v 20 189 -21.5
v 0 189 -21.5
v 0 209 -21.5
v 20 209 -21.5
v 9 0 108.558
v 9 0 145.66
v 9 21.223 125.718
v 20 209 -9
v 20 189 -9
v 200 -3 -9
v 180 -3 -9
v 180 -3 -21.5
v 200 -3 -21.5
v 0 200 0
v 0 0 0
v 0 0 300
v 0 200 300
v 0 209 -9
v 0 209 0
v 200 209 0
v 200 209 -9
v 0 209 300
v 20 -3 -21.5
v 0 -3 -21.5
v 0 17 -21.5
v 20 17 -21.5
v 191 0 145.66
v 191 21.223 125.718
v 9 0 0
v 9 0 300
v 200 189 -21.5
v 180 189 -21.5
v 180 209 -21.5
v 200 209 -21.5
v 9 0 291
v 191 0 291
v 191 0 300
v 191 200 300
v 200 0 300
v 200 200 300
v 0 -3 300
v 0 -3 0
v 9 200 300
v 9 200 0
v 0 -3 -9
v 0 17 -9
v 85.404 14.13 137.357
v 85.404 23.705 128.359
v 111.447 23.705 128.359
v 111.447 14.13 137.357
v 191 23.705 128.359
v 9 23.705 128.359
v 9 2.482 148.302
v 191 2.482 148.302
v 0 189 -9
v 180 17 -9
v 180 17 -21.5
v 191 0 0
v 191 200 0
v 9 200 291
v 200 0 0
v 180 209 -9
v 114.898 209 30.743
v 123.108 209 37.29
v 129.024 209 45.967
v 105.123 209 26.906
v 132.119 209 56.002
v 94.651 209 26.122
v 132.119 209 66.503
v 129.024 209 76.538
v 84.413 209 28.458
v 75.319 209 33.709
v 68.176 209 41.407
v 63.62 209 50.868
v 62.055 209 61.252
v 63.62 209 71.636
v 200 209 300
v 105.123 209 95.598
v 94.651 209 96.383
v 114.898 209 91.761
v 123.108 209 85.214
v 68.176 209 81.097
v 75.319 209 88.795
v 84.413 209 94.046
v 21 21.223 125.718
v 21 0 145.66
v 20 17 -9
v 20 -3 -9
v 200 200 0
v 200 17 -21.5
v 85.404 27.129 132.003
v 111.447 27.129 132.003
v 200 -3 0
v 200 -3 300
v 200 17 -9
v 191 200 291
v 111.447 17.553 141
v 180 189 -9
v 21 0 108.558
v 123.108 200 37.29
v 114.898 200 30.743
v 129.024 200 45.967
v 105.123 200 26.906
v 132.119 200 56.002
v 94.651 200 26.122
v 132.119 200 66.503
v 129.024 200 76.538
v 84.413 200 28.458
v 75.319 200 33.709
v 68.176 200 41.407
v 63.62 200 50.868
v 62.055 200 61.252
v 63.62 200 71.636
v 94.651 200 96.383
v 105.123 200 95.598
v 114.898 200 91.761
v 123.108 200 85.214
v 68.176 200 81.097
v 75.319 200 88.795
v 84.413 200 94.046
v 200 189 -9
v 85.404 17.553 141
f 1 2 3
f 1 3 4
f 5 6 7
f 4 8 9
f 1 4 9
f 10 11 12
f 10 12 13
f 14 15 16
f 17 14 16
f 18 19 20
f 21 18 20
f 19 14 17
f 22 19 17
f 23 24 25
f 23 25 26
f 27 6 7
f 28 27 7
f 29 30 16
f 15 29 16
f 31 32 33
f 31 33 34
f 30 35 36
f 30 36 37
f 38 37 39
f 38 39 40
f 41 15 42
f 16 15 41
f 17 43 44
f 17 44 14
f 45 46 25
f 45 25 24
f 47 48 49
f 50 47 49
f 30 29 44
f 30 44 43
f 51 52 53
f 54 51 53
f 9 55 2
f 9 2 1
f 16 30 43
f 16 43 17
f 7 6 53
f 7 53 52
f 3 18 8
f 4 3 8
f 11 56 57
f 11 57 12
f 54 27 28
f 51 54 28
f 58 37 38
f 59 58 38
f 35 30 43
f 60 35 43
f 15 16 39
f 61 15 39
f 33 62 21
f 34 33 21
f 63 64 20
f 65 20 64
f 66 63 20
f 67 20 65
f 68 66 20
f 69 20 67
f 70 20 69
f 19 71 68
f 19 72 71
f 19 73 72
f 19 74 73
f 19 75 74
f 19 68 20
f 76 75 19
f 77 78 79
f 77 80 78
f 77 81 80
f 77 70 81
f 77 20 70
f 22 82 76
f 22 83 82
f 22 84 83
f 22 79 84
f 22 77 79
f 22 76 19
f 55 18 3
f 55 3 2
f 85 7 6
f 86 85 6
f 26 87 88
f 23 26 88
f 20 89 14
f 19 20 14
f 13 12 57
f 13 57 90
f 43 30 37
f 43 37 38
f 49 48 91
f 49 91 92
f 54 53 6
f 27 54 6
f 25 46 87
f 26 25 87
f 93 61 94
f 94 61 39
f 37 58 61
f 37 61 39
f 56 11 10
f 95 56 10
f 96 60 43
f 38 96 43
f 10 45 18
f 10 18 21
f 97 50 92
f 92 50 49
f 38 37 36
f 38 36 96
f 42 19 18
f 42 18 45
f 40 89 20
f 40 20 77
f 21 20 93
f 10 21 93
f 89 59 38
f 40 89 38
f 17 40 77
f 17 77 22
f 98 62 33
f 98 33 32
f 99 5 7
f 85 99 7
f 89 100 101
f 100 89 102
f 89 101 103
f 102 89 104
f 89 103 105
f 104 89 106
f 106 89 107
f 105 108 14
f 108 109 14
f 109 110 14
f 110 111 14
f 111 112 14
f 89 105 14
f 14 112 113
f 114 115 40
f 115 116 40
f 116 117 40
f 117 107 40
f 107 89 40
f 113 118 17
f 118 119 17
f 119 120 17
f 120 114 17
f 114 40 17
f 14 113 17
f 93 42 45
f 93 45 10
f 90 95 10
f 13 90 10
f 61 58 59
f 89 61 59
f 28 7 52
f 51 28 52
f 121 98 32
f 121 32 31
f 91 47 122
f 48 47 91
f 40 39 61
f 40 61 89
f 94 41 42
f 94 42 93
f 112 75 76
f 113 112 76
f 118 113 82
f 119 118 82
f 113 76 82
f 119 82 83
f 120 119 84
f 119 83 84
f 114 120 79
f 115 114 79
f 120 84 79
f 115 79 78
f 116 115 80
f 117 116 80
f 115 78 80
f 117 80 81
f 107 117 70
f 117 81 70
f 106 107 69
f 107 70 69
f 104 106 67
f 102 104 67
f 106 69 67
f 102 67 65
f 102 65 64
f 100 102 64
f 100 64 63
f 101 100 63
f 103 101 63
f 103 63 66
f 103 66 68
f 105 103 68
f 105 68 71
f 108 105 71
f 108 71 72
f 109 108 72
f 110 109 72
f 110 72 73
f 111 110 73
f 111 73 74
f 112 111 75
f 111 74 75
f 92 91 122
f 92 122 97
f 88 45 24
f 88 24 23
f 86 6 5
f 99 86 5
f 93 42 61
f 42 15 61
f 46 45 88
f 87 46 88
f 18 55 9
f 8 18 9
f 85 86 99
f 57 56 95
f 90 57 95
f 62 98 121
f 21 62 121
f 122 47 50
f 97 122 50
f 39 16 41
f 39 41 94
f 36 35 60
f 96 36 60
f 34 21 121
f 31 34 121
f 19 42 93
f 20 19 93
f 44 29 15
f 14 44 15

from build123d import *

# Parameters (mm, degrees)
F0_W      = 200
F0_H      = 300
F1_DEPTH  = 1.5
F2_DEPTH  = 1.5
F3_W      = 9
F3_H      = 300
F4_DEPTH  = 200
F6_DEPTH  = 12
F8_DEPTH  = 182
F9_W      = 26.0420143604
F9_H      = 13.1397843487
F10_DEPTH = 5
F11_W     = 200
F11_H     = 9
F12_DEPTH = 182
F13_W     = 200
F13_H     = 300
F14_DEPTH = 9
F15_W     = 200
F15_H     = 300
F16_DEPTH = 9
F17_R     = 35.2290412764
F18_DEPTH = 9
F19_W     = 200
F19_H     = 212
F20_DEPTH = 9
F21_W     = 20
F21_H     = 20
F22_DEPTH = 12.5
F23_W     = 20
F23_H     = 20
F24_DEPTH = 12.5
F25_W     = 20
F25_H     = 20
F26_DEPTH = 12.5
F27_W     = 20
F27_H     = 20
F28_DEPTH = 12.5


with BuildPart() as f1:
    # F0 (on Front) → F1 (new body)
    with BuildSketch(Plane.XZ):
        with Locations((100, 150)):
            Rectangle(F0_W, F0_H)
    extrude(amount=F1_DEPTH)

    # F2 (add): a face of the model
    f2_faces = [f1.faces().sort_by_distance(p)[0] for p in [
        (100, -1.5, 150),
    ]]
    extrude(f2_faces, amount=F2_DEPTH)


with BuildPart() as f4:
    # F3 (on face) → F4 (new body)
    with BuildSketch(Plane(origin=(0, 0, 0), x_dir=(-1, 0, 0), z_dir=(0, 1, 0))):
        with Locations((-4.5, 150)):
            Rectangle(F3_W, F3_H)
    extrude(amount=F4_DEPTH)


with BuildPart() as f6:
    # F5 (on face) → F6 (new body)
    with BuildSketch(Plane.YZ.offset(9)):
        Polygon((21.2234966457, 125.7177591324), (0, 145.660340786), (0, 108.5578650236), align=None)
    extrude(amount=F6_DEPTH)


with BuildPart() as f8:
    # F7 (on face) → F8 (new body)
    with BuildSketch(Plane.YZ.offset(9)):
        Polygon((0, 145.660340786), (21.2234966457, 125.7177591324), (23.7052597113, 128.3589262096), (2.4817630656, 148.3015078632), align=None)
    extrude(amount=F8_DEPTH)


with BuildPart() as f10:
    # F9 (on face) → F10 (new body)
    with BuildSketch(Plane(origin=(0, 75.1710426471, 79.9992899207), x_dir=(1, 0, 0), z_dir=(0, 0.6847731802, 0.7287562636))):
        with Locations((98.4255000949, -77.1912857827)):
            Rectangle(F9_W, F9_H)
    extrude(amount=F10_DEPTH)


with BuildPart() as f12:
    # F11 (on face) → F12 (new body)
    with BuildSketch(Plane.YZ.offset(9)):
        with Locations((100, 295.5)):
            Rectangle(F11_W, F11_H)
    extrude(amount=F12_DEPTH)


with BuildPart() as f14:
    # F13 (on face) → F14 (new body)
    with BuildSketch(Plane.YZ.offset(191)):
        with Locations((100, 150)):
            Rectangle(F13_W, F13_H)
    extrude(amount=F14_DEPTH)


with BuildPart() as f16:
    # F15 (on face) → F16 (new body)
    with BuildSketch(Plane(origin=(0, 200, 0), x_dir=(-1, 0, 0), z_dir=(0, 1, 0))):
        with Locations((-100, 150)):
            Rectangle(F15_W, F15_H)
    extrude(amount=F16_DEPTH)

    # F17 (on face) → F18 (cut)
    with BuildSketch(Plane(origin=(0, 209, 0), x_dir=(-1, 0, 0), z_dir=(0, 1, 0))):
        with Locations((-97.2835719585, 61.2522102892)):
            Circle(F17_R)
    extrude(amount=-F18_DEPTH, mode=Mode.SUBTRACT)


with BuildPart() as f20:
    # F19 (on face) → F20 (new body)
    with BuildSketch(Plane(origin=(0, 0, 0), x_dir=(1, 0, 0), z_dir=(0, 0, -1))):
        with Locations((100, -103)):
            Rectangle(F19_W, F19_H)
    extrude(amount=F20_DEPTH)


with BuildPart() as f22:
    # F21 (on face) → F22 (new body)
    with BuildSketch(Plane(origin=(0, 0, -9), x_dir=(1, 0, 0), z_dir=(0, 0, -1))):
        with Locations((10, -7)):
            Rectangle(F21_W, F21_H)
    extrude(amount=F22_DEPTH)


with BuildPart() as f24:
    # F23 (on face) → F24 (new body)
    with BuildSketch(Plane(origin=(0, 0, -9), x_dir=(1, 0, 0), z_dir=(0, 0, -1))):
        with Locations((190, -7)):
            Rectangle(F23_W, F23_H)
    extrude(amount=F24_DEPTH)


with BuildPart() as f26:
    # F25 (on face) → F26 (new body)
    with BuildSketch(Plane(origin=(0, 0, -9), x_dir=(1, 0, 0), z_dir=(0, 0, -1))):
        with Locations((190, -199)):
            Rectangle(F25_W, F25_H)
    extrude(amount=F26_DEPTH)


with BuildPart() as f28:
    # F27 (on face) → F28 (new body)
    with BuildSketch(Plane(origin=(0, 0, -9), x_dir=(1, 0, 0), z_dir=(0, 0, -1))):
        with Locations((10, -199)):
            Rectangle(F27_W, F27_H)
    extrude(amount=F28_DEPTH)


solid = Compound([f1.part, f4.part, f6.part, f8.part, f10.part, f12.part, f14.part, f16.part, f20.part, f22.part, f24.part, f26.part, f28.part])
